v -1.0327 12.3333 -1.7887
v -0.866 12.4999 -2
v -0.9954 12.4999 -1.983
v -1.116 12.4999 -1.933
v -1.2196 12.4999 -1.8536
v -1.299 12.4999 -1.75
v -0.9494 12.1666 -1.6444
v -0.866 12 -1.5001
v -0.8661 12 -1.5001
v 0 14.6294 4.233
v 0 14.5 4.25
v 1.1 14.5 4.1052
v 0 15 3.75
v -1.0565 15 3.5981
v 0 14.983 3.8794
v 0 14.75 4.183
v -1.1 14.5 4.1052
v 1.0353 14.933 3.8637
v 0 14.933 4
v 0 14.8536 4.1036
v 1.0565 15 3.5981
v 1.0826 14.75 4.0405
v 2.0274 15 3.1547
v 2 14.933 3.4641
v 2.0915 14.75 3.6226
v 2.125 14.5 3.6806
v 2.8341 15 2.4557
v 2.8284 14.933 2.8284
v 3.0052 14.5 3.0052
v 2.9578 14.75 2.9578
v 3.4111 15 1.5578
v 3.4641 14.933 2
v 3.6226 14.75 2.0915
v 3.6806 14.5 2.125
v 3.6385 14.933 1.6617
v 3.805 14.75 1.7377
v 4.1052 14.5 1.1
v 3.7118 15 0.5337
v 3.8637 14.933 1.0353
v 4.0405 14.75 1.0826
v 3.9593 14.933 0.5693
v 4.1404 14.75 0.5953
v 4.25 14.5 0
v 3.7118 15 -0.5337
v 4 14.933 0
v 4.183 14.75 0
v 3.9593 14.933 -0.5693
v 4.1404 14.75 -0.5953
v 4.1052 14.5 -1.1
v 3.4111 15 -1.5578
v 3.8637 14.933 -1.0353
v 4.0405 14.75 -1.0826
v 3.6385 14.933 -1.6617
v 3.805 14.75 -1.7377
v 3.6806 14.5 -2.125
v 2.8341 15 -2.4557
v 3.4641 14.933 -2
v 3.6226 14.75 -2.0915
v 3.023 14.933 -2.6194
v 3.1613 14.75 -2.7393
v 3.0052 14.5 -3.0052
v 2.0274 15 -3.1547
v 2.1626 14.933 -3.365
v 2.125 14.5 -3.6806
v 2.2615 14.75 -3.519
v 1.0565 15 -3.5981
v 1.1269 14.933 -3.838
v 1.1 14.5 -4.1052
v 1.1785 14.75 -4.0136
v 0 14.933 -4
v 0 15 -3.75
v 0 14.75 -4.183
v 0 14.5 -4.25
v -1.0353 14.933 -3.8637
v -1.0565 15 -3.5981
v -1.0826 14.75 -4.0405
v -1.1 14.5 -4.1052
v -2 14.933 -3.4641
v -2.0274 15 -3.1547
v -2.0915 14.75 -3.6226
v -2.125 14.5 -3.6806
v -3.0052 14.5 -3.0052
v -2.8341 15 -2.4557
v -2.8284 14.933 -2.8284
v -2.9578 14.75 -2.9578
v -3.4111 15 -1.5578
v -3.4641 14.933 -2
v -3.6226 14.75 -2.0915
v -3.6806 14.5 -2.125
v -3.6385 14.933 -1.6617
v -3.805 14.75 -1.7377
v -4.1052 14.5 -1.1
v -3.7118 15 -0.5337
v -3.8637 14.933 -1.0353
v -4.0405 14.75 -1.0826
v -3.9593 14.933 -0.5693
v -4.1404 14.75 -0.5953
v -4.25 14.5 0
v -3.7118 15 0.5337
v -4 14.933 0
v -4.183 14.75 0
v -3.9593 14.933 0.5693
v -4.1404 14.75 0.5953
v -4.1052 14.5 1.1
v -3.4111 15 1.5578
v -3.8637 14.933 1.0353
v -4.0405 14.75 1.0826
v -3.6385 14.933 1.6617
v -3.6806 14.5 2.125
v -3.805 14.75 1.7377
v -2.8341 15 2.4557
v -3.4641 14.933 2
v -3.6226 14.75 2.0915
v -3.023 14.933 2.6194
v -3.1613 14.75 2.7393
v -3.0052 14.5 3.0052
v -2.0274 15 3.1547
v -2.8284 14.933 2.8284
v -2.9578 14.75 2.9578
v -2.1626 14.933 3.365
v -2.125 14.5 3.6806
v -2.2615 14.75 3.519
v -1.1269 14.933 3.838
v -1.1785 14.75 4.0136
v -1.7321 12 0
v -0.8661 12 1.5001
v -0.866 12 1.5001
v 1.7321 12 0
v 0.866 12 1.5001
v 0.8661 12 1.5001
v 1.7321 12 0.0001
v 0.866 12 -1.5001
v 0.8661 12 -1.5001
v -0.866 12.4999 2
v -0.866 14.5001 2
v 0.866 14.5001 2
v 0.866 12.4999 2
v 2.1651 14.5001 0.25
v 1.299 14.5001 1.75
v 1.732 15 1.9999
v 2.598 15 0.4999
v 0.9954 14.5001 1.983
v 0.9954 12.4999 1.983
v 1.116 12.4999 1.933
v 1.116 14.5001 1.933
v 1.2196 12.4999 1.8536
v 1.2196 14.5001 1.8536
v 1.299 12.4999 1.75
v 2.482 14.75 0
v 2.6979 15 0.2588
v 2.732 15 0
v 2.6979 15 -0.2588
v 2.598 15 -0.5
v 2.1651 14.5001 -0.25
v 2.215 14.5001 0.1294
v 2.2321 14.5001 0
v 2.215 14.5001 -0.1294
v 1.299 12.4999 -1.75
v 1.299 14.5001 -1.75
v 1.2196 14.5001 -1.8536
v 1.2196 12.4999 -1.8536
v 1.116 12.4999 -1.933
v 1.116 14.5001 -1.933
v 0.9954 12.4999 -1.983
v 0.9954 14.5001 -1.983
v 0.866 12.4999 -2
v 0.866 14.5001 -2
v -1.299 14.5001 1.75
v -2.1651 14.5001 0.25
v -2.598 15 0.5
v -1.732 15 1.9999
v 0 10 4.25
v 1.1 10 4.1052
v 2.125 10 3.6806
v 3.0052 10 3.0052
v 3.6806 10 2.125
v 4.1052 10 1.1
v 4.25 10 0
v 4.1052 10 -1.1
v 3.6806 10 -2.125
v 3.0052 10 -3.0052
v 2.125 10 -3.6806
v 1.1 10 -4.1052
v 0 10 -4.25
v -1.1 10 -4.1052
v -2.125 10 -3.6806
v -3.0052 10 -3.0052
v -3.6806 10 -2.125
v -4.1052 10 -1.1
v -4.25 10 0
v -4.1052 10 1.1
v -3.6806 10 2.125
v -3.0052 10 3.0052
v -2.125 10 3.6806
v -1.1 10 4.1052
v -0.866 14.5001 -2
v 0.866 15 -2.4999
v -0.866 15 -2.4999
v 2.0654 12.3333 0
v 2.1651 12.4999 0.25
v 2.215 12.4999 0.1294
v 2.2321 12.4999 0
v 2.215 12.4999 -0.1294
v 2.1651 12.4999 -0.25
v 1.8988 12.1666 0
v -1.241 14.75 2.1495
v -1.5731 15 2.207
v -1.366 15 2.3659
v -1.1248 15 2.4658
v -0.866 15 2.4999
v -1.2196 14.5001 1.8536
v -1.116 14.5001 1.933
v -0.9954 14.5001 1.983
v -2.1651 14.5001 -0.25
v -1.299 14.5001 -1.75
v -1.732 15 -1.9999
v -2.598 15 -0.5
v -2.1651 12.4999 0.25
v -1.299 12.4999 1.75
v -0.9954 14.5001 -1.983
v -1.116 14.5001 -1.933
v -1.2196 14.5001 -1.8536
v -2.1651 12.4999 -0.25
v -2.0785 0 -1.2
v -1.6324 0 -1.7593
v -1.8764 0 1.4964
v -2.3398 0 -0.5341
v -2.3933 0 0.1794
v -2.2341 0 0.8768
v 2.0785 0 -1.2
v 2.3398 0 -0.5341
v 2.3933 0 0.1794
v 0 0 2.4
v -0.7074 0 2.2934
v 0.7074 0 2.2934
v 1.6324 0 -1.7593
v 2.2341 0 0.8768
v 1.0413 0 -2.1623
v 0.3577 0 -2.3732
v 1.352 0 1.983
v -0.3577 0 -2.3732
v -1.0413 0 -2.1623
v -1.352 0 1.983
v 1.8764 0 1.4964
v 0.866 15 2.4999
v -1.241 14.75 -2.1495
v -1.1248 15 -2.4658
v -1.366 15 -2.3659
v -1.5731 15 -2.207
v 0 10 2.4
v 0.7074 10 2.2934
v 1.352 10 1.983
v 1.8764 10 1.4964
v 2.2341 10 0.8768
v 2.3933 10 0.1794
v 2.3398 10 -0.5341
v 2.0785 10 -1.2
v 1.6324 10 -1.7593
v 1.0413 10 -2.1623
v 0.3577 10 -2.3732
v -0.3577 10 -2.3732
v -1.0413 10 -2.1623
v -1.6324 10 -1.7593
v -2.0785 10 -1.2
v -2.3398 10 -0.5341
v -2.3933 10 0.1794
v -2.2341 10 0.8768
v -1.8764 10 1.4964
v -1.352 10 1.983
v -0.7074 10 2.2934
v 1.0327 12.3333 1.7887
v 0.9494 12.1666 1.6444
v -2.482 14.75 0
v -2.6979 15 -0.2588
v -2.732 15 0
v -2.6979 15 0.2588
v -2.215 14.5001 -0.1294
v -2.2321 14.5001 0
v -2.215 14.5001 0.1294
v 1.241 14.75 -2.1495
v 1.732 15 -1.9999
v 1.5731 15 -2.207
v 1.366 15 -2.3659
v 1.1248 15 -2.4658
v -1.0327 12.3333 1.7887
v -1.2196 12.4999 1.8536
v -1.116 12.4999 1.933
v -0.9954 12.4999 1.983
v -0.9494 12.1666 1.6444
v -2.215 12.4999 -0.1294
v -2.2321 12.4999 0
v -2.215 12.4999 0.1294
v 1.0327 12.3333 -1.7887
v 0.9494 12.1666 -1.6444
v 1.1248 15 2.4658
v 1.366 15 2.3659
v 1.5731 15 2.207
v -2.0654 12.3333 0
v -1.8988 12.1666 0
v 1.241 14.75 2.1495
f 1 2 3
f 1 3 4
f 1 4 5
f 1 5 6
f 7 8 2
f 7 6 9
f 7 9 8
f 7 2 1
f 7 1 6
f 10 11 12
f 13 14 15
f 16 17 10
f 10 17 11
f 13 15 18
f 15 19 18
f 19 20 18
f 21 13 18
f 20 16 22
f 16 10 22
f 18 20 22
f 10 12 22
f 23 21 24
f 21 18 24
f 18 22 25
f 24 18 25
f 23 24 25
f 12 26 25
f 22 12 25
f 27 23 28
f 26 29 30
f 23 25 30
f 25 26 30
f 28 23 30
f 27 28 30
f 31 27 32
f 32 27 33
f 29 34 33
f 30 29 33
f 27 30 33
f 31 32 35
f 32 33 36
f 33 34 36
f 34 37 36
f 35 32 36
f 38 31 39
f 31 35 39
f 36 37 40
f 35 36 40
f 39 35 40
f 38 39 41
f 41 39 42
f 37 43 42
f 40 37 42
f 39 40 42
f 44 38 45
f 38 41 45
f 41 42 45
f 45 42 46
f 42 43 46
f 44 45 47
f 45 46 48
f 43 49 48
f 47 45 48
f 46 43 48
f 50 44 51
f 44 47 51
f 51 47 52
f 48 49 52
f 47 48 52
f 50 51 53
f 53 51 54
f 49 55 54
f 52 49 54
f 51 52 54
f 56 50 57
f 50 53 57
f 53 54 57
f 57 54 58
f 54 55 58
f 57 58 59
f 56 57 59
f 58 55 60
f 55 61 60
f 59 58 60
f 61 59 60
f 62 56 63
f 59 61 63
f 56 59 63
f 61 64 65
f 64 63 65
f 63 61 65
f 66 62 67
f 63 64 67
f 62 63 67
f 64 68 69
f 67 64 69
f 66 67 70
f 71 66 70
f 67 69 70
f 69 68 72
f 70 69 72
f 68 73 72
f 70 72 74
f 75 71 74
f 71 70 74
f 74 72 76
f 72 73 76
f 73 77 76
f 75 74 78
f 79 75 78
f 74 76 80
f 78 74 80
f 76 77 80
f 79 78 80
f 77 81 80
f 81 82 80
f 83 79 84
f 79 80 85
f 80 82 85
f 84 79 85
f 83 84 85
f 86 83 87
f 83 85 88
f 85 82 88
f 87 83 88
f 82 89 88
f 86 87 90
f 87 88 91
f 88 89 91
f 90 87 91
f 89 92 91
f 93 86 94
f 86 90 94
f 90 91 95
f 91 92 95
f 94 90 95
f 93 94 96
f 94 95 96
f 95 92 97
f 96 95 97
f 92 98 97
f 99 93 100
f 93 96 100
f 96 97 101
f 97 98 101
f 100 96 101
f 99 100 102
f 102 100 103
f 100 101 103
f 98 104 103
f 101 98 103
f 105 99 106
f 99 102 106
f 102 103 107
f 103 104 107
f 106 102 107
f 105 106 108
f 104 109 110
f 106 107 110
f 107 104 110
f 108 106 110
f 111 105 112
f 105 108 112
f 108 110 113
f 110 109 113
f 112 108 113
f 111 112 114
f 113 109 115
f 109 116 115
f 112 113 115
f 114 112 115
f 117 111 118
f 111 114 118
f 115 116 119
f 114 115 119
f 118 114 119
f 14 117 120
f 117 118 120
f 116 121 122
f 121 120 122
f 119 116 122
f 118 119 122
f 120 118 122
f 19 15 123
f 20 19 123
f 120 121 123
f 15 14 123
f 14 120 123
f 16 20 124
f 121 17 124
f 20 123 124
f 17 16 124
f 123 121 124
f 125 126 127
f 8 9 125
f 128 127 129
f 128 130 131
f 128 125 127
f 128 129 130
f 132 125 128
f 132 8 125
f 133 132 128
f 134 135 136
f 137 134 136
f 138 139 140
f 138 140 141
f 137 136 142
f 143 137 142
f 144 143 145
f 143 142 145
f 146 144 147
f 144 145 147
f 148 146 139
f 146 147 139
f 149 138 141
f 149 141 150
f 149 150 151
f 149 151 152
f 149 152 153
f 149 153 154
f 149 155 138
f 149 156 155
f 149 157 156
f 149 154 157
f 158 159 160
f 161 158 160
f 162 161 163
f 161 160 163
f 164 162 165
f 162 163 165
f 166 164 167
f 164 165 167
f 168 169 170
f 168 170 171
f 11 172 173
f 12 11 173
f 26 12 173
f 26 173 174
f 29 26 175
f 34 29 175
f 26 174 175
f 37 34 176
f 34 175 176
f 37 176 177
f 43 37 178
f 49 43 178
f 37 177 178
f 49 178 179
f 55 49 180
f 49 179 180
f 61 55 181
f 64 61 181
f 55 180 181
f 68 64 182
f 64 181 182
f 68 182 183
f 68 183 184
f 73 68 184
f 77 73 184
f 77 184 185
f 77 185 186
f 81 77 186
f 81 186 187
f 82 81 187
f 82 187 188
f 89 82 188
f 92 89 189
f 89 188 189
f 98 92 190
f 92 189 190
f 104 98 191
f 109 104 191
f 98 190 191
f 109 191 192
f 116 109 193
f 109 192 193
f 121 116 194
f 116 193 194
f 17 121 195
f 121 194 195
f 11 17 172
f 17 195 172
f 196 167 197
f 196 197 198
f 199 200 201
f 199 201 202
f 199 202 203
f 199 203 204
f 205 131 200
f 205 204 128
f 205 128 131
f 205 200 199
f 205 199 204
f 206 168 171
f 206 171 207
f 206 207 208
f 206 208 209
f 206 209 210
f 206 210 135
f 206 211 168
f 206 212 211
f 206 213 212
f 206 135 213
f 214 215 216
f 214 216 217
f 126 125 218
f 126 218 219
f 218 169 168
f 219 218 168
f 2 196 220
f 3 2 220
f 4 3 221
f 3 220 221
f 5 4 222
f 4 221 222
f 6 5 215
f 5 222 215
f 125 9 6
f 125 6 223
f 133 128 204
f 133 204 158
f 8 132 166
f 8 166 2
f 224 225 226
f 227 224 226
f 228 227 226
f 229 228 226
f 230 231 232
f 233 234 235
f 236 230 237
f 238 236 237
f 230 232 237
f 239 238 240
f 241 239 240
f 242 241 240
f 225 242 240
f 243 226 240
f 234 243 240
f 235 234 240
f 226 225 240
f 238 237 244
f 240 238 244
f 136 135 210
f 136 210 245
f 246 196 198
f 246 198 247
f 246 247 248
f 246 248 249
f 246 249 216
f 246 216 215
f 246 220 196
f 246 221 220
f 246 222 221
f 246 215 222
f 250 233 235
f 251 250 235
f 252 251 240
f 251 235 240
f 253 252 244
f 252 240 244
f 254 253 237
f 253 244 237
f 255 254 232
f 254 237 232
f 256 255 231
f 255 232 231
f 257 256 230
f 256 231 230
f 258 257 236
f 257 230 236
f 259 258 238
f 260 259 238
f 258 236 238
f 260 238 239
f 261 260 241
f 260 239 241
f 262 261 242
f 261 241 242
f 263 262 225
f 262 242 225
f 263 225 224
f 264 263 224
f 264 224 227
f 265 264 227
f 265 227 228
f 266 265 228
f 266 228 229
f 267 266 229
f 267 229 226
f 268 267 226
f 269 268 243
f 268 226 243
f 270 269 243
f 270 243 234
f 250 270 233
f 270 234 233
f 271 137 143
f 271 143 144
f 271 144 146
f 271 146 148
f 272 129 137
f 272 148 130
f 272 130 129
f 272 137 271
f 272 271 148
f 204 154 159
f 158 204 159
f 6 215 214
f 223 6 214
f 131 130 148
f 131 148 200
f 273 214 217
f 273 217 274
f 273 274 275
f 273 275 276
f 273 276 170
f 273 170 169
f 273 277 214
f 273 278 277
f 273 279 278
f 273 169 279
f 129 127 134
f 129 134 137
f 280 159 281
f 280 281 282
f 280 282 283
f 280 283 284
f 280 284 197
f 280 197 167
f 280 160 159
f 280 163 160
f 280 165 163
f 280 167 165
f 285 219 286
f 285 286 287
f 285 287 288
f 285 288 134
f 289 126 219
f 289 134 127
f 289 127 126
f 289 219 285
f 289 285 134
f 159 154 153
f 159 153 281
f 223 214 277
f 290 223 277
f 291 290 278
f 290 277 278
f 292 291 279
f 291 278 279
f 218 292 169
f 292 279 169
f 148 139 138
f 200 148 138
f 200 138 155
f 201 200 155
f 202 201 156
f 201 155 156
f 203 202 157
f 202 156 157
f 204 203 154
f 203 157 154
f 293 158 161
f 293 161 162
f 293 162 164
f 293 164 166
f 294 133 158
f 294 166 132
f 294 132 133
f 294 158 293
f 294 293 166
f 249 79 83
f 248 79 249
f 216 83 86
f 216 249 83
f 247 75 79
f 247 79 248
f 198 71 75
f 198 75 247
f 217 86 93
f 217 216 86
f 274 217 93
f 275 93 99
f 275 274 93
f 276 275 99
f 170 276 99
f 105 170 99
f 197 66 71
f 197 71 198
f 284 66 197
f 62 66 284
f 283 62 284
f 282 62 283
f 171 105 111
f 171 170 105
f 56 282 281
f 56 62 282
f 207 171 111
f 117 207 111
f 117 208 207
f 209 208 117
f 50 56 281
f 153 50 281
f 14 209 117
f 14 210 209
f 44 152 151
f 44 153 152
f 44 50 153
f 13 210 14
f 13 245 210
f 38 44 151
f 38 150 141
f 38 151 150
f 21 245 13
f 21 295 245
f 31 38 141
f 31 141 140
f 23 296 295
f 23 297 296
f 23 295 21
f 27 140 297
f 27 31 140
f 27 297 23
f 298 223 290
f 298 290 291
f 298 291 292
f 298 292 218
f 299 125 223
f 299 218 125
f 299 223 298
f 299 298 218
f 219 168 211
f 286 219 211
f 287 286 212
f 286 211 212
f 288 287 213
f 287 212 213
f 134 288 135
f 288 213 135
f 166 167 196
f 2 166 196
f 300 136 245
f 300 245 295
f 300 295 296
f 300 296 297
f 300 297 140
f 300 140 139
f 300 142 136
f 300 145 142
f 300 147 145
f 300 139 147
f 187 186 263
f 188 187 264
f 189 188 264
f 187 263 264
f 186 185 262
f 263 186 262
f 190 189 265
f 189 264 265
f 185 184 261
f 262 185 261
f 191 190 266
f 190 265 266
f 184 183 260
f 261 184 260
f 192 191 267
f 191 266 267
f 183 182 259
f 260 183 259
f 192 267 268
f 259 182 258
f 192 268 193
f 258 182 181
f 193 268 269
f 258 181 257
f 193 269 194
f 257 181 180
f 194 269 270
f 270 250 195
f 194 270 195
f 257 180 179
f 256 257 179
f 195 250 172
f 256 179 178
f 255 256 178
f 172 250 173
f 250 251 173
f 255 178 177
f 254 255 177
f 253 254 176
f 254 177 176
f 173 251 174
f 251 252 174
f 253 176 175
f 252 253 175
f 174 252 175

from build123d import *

# Parameters (mm, degrees)
SKETCH1_R           = 2.4
BOSS_EXTRUDE1_DEPTH = 10
SKETCH2_R           = 4.25
BOSS_EXTRUDE2_DEPTH = 5
CUT_EXTRUDE1_DEPTH  = 3
CHAMFER1_SIZE       = 0.5
FILLET1_R           = 0.5


with BuildPart() as part:
    # Sketch1 → Boss-Extrude1 (new body)
    with BuildSketch(Plane(origin=(0, 0, 0), x_dir=(1, 0, 0), z_dir=(0, 1, 0))):
        with Locations(Location((0, 0, 0), (0, 0, 270))):
            Circle(SKETCH1_R)
    extrude(amount=BOSS_EXTRUDE1_DEPTH)

    # Sketch2 → Boss-Extrude2 (add)
    with BuildSketch(Plane(origin=(0, 10, 0), x_dir=(1, 0, 0), z_dir=(0, 1, 0))):
        with Locations(Location((0, 0, 0), (0, 0, 270))):
            Circle(SKETCH2_R)
    extrude(amount=BOSS_EXTRUDE2_DEPTH)

    # Sketch3 → Cut-Extrude1 (cut)
    with BuildSketch(Plane(origin=(0, 15, 0), x_dir=(1, 0, 0), z_dir=(0, 1, 0))):
        with BuildLine():
            Line((2.165063509, 0.25), (1.299038106, 1.75))
            ThreePointArc((1.299038106, 1.75), (1.116025404, 1.933012702), (0.866025404, 2))
            Line((0.866025404, 2), (-0.866025404, 2))
            ThreePointArc((-0.866025404, 2), (-1.116025404, 1.933012702), (-1.299038106, 1.75))
            Line((-1.299038106, 1.75), (-2.165063509, 0.25))
            ThreePointArc((-2.165063509, 0.25), (-2.232050808, 0), (-2.165063509, -0.25))
            Line((-2.165063509, -0.25), (-1.299038106, -1.75))
            ThreePointArc((-1.299038106, -1.75), (-1.116025404, -1.933012702), (-0.866025404, -2))
            Line((-0.866025404, -2), (0.866025404, -2))
            ThreePointArc((0.866025404, -2), (1.116025404, -1.933012702), (1.299038106, -1.75))
            Line((1.299038106, -1.75), (2.165063509, -0.25))
            ThreePointArc((2.165063509, -0.25), (2.232050808, 0), (2.165063509, 0.25))
        make_face()
    extrude(amount=-CUT_EXTRUDE1_DEPTH, mode=Mode.SUBTRACT)

    # Chamfer1
    chamfer1_edges = [part.edges().sort_by_distance(p)[0] for p in [
        (-2.232050808, 12, 0),
        (-1.732050808, 12, -1),
        (-1.116025404, 12, -1.933012702),
        (0, 12, -2),
        (1.116025404, 12, -1.933012702),
        (1.732050808, 12, -1),
        (2.232050808, 12, 0),
        (1.732050808, 12, 1),
        (1.116025404, 12, 1.933012702),
        (0, 12, 2),
        (-1.116025404, 12, 1.933012702),
        (-1.732050808, 12, 1),
        (-2.232050808, 15, 0),
        (-1.732050808, 15, 1),
        (-1.116025404, 15, 1.933012702),
        (0, 15, 2),
        (1.116025404, 15, 1.933012702),
        (1.732050808, 15, 1),
        (2.232050808, 15, 0),
        (1.732050808, 15, -1),
        (1.116025404, 15, -1.933012702),
        (0, 15, -2),
        (-1.116025404, 15, -1.933012702),
        (-1.732050808, 15, -1),
    ]]
    chamfer(chamfer1_edges, length=CHAMFER1_SIZE - 0.0001)  # a hair under: the kernel refuses the full size

    # Fillet1
    fillet1_edges = [part.edges().sort_by_distance(p)[0] for p in [
        (0, 15, -4.25),
    ]]
    fillet(fillet1_edges, radius=FILLET1_R)


solid = part.part
